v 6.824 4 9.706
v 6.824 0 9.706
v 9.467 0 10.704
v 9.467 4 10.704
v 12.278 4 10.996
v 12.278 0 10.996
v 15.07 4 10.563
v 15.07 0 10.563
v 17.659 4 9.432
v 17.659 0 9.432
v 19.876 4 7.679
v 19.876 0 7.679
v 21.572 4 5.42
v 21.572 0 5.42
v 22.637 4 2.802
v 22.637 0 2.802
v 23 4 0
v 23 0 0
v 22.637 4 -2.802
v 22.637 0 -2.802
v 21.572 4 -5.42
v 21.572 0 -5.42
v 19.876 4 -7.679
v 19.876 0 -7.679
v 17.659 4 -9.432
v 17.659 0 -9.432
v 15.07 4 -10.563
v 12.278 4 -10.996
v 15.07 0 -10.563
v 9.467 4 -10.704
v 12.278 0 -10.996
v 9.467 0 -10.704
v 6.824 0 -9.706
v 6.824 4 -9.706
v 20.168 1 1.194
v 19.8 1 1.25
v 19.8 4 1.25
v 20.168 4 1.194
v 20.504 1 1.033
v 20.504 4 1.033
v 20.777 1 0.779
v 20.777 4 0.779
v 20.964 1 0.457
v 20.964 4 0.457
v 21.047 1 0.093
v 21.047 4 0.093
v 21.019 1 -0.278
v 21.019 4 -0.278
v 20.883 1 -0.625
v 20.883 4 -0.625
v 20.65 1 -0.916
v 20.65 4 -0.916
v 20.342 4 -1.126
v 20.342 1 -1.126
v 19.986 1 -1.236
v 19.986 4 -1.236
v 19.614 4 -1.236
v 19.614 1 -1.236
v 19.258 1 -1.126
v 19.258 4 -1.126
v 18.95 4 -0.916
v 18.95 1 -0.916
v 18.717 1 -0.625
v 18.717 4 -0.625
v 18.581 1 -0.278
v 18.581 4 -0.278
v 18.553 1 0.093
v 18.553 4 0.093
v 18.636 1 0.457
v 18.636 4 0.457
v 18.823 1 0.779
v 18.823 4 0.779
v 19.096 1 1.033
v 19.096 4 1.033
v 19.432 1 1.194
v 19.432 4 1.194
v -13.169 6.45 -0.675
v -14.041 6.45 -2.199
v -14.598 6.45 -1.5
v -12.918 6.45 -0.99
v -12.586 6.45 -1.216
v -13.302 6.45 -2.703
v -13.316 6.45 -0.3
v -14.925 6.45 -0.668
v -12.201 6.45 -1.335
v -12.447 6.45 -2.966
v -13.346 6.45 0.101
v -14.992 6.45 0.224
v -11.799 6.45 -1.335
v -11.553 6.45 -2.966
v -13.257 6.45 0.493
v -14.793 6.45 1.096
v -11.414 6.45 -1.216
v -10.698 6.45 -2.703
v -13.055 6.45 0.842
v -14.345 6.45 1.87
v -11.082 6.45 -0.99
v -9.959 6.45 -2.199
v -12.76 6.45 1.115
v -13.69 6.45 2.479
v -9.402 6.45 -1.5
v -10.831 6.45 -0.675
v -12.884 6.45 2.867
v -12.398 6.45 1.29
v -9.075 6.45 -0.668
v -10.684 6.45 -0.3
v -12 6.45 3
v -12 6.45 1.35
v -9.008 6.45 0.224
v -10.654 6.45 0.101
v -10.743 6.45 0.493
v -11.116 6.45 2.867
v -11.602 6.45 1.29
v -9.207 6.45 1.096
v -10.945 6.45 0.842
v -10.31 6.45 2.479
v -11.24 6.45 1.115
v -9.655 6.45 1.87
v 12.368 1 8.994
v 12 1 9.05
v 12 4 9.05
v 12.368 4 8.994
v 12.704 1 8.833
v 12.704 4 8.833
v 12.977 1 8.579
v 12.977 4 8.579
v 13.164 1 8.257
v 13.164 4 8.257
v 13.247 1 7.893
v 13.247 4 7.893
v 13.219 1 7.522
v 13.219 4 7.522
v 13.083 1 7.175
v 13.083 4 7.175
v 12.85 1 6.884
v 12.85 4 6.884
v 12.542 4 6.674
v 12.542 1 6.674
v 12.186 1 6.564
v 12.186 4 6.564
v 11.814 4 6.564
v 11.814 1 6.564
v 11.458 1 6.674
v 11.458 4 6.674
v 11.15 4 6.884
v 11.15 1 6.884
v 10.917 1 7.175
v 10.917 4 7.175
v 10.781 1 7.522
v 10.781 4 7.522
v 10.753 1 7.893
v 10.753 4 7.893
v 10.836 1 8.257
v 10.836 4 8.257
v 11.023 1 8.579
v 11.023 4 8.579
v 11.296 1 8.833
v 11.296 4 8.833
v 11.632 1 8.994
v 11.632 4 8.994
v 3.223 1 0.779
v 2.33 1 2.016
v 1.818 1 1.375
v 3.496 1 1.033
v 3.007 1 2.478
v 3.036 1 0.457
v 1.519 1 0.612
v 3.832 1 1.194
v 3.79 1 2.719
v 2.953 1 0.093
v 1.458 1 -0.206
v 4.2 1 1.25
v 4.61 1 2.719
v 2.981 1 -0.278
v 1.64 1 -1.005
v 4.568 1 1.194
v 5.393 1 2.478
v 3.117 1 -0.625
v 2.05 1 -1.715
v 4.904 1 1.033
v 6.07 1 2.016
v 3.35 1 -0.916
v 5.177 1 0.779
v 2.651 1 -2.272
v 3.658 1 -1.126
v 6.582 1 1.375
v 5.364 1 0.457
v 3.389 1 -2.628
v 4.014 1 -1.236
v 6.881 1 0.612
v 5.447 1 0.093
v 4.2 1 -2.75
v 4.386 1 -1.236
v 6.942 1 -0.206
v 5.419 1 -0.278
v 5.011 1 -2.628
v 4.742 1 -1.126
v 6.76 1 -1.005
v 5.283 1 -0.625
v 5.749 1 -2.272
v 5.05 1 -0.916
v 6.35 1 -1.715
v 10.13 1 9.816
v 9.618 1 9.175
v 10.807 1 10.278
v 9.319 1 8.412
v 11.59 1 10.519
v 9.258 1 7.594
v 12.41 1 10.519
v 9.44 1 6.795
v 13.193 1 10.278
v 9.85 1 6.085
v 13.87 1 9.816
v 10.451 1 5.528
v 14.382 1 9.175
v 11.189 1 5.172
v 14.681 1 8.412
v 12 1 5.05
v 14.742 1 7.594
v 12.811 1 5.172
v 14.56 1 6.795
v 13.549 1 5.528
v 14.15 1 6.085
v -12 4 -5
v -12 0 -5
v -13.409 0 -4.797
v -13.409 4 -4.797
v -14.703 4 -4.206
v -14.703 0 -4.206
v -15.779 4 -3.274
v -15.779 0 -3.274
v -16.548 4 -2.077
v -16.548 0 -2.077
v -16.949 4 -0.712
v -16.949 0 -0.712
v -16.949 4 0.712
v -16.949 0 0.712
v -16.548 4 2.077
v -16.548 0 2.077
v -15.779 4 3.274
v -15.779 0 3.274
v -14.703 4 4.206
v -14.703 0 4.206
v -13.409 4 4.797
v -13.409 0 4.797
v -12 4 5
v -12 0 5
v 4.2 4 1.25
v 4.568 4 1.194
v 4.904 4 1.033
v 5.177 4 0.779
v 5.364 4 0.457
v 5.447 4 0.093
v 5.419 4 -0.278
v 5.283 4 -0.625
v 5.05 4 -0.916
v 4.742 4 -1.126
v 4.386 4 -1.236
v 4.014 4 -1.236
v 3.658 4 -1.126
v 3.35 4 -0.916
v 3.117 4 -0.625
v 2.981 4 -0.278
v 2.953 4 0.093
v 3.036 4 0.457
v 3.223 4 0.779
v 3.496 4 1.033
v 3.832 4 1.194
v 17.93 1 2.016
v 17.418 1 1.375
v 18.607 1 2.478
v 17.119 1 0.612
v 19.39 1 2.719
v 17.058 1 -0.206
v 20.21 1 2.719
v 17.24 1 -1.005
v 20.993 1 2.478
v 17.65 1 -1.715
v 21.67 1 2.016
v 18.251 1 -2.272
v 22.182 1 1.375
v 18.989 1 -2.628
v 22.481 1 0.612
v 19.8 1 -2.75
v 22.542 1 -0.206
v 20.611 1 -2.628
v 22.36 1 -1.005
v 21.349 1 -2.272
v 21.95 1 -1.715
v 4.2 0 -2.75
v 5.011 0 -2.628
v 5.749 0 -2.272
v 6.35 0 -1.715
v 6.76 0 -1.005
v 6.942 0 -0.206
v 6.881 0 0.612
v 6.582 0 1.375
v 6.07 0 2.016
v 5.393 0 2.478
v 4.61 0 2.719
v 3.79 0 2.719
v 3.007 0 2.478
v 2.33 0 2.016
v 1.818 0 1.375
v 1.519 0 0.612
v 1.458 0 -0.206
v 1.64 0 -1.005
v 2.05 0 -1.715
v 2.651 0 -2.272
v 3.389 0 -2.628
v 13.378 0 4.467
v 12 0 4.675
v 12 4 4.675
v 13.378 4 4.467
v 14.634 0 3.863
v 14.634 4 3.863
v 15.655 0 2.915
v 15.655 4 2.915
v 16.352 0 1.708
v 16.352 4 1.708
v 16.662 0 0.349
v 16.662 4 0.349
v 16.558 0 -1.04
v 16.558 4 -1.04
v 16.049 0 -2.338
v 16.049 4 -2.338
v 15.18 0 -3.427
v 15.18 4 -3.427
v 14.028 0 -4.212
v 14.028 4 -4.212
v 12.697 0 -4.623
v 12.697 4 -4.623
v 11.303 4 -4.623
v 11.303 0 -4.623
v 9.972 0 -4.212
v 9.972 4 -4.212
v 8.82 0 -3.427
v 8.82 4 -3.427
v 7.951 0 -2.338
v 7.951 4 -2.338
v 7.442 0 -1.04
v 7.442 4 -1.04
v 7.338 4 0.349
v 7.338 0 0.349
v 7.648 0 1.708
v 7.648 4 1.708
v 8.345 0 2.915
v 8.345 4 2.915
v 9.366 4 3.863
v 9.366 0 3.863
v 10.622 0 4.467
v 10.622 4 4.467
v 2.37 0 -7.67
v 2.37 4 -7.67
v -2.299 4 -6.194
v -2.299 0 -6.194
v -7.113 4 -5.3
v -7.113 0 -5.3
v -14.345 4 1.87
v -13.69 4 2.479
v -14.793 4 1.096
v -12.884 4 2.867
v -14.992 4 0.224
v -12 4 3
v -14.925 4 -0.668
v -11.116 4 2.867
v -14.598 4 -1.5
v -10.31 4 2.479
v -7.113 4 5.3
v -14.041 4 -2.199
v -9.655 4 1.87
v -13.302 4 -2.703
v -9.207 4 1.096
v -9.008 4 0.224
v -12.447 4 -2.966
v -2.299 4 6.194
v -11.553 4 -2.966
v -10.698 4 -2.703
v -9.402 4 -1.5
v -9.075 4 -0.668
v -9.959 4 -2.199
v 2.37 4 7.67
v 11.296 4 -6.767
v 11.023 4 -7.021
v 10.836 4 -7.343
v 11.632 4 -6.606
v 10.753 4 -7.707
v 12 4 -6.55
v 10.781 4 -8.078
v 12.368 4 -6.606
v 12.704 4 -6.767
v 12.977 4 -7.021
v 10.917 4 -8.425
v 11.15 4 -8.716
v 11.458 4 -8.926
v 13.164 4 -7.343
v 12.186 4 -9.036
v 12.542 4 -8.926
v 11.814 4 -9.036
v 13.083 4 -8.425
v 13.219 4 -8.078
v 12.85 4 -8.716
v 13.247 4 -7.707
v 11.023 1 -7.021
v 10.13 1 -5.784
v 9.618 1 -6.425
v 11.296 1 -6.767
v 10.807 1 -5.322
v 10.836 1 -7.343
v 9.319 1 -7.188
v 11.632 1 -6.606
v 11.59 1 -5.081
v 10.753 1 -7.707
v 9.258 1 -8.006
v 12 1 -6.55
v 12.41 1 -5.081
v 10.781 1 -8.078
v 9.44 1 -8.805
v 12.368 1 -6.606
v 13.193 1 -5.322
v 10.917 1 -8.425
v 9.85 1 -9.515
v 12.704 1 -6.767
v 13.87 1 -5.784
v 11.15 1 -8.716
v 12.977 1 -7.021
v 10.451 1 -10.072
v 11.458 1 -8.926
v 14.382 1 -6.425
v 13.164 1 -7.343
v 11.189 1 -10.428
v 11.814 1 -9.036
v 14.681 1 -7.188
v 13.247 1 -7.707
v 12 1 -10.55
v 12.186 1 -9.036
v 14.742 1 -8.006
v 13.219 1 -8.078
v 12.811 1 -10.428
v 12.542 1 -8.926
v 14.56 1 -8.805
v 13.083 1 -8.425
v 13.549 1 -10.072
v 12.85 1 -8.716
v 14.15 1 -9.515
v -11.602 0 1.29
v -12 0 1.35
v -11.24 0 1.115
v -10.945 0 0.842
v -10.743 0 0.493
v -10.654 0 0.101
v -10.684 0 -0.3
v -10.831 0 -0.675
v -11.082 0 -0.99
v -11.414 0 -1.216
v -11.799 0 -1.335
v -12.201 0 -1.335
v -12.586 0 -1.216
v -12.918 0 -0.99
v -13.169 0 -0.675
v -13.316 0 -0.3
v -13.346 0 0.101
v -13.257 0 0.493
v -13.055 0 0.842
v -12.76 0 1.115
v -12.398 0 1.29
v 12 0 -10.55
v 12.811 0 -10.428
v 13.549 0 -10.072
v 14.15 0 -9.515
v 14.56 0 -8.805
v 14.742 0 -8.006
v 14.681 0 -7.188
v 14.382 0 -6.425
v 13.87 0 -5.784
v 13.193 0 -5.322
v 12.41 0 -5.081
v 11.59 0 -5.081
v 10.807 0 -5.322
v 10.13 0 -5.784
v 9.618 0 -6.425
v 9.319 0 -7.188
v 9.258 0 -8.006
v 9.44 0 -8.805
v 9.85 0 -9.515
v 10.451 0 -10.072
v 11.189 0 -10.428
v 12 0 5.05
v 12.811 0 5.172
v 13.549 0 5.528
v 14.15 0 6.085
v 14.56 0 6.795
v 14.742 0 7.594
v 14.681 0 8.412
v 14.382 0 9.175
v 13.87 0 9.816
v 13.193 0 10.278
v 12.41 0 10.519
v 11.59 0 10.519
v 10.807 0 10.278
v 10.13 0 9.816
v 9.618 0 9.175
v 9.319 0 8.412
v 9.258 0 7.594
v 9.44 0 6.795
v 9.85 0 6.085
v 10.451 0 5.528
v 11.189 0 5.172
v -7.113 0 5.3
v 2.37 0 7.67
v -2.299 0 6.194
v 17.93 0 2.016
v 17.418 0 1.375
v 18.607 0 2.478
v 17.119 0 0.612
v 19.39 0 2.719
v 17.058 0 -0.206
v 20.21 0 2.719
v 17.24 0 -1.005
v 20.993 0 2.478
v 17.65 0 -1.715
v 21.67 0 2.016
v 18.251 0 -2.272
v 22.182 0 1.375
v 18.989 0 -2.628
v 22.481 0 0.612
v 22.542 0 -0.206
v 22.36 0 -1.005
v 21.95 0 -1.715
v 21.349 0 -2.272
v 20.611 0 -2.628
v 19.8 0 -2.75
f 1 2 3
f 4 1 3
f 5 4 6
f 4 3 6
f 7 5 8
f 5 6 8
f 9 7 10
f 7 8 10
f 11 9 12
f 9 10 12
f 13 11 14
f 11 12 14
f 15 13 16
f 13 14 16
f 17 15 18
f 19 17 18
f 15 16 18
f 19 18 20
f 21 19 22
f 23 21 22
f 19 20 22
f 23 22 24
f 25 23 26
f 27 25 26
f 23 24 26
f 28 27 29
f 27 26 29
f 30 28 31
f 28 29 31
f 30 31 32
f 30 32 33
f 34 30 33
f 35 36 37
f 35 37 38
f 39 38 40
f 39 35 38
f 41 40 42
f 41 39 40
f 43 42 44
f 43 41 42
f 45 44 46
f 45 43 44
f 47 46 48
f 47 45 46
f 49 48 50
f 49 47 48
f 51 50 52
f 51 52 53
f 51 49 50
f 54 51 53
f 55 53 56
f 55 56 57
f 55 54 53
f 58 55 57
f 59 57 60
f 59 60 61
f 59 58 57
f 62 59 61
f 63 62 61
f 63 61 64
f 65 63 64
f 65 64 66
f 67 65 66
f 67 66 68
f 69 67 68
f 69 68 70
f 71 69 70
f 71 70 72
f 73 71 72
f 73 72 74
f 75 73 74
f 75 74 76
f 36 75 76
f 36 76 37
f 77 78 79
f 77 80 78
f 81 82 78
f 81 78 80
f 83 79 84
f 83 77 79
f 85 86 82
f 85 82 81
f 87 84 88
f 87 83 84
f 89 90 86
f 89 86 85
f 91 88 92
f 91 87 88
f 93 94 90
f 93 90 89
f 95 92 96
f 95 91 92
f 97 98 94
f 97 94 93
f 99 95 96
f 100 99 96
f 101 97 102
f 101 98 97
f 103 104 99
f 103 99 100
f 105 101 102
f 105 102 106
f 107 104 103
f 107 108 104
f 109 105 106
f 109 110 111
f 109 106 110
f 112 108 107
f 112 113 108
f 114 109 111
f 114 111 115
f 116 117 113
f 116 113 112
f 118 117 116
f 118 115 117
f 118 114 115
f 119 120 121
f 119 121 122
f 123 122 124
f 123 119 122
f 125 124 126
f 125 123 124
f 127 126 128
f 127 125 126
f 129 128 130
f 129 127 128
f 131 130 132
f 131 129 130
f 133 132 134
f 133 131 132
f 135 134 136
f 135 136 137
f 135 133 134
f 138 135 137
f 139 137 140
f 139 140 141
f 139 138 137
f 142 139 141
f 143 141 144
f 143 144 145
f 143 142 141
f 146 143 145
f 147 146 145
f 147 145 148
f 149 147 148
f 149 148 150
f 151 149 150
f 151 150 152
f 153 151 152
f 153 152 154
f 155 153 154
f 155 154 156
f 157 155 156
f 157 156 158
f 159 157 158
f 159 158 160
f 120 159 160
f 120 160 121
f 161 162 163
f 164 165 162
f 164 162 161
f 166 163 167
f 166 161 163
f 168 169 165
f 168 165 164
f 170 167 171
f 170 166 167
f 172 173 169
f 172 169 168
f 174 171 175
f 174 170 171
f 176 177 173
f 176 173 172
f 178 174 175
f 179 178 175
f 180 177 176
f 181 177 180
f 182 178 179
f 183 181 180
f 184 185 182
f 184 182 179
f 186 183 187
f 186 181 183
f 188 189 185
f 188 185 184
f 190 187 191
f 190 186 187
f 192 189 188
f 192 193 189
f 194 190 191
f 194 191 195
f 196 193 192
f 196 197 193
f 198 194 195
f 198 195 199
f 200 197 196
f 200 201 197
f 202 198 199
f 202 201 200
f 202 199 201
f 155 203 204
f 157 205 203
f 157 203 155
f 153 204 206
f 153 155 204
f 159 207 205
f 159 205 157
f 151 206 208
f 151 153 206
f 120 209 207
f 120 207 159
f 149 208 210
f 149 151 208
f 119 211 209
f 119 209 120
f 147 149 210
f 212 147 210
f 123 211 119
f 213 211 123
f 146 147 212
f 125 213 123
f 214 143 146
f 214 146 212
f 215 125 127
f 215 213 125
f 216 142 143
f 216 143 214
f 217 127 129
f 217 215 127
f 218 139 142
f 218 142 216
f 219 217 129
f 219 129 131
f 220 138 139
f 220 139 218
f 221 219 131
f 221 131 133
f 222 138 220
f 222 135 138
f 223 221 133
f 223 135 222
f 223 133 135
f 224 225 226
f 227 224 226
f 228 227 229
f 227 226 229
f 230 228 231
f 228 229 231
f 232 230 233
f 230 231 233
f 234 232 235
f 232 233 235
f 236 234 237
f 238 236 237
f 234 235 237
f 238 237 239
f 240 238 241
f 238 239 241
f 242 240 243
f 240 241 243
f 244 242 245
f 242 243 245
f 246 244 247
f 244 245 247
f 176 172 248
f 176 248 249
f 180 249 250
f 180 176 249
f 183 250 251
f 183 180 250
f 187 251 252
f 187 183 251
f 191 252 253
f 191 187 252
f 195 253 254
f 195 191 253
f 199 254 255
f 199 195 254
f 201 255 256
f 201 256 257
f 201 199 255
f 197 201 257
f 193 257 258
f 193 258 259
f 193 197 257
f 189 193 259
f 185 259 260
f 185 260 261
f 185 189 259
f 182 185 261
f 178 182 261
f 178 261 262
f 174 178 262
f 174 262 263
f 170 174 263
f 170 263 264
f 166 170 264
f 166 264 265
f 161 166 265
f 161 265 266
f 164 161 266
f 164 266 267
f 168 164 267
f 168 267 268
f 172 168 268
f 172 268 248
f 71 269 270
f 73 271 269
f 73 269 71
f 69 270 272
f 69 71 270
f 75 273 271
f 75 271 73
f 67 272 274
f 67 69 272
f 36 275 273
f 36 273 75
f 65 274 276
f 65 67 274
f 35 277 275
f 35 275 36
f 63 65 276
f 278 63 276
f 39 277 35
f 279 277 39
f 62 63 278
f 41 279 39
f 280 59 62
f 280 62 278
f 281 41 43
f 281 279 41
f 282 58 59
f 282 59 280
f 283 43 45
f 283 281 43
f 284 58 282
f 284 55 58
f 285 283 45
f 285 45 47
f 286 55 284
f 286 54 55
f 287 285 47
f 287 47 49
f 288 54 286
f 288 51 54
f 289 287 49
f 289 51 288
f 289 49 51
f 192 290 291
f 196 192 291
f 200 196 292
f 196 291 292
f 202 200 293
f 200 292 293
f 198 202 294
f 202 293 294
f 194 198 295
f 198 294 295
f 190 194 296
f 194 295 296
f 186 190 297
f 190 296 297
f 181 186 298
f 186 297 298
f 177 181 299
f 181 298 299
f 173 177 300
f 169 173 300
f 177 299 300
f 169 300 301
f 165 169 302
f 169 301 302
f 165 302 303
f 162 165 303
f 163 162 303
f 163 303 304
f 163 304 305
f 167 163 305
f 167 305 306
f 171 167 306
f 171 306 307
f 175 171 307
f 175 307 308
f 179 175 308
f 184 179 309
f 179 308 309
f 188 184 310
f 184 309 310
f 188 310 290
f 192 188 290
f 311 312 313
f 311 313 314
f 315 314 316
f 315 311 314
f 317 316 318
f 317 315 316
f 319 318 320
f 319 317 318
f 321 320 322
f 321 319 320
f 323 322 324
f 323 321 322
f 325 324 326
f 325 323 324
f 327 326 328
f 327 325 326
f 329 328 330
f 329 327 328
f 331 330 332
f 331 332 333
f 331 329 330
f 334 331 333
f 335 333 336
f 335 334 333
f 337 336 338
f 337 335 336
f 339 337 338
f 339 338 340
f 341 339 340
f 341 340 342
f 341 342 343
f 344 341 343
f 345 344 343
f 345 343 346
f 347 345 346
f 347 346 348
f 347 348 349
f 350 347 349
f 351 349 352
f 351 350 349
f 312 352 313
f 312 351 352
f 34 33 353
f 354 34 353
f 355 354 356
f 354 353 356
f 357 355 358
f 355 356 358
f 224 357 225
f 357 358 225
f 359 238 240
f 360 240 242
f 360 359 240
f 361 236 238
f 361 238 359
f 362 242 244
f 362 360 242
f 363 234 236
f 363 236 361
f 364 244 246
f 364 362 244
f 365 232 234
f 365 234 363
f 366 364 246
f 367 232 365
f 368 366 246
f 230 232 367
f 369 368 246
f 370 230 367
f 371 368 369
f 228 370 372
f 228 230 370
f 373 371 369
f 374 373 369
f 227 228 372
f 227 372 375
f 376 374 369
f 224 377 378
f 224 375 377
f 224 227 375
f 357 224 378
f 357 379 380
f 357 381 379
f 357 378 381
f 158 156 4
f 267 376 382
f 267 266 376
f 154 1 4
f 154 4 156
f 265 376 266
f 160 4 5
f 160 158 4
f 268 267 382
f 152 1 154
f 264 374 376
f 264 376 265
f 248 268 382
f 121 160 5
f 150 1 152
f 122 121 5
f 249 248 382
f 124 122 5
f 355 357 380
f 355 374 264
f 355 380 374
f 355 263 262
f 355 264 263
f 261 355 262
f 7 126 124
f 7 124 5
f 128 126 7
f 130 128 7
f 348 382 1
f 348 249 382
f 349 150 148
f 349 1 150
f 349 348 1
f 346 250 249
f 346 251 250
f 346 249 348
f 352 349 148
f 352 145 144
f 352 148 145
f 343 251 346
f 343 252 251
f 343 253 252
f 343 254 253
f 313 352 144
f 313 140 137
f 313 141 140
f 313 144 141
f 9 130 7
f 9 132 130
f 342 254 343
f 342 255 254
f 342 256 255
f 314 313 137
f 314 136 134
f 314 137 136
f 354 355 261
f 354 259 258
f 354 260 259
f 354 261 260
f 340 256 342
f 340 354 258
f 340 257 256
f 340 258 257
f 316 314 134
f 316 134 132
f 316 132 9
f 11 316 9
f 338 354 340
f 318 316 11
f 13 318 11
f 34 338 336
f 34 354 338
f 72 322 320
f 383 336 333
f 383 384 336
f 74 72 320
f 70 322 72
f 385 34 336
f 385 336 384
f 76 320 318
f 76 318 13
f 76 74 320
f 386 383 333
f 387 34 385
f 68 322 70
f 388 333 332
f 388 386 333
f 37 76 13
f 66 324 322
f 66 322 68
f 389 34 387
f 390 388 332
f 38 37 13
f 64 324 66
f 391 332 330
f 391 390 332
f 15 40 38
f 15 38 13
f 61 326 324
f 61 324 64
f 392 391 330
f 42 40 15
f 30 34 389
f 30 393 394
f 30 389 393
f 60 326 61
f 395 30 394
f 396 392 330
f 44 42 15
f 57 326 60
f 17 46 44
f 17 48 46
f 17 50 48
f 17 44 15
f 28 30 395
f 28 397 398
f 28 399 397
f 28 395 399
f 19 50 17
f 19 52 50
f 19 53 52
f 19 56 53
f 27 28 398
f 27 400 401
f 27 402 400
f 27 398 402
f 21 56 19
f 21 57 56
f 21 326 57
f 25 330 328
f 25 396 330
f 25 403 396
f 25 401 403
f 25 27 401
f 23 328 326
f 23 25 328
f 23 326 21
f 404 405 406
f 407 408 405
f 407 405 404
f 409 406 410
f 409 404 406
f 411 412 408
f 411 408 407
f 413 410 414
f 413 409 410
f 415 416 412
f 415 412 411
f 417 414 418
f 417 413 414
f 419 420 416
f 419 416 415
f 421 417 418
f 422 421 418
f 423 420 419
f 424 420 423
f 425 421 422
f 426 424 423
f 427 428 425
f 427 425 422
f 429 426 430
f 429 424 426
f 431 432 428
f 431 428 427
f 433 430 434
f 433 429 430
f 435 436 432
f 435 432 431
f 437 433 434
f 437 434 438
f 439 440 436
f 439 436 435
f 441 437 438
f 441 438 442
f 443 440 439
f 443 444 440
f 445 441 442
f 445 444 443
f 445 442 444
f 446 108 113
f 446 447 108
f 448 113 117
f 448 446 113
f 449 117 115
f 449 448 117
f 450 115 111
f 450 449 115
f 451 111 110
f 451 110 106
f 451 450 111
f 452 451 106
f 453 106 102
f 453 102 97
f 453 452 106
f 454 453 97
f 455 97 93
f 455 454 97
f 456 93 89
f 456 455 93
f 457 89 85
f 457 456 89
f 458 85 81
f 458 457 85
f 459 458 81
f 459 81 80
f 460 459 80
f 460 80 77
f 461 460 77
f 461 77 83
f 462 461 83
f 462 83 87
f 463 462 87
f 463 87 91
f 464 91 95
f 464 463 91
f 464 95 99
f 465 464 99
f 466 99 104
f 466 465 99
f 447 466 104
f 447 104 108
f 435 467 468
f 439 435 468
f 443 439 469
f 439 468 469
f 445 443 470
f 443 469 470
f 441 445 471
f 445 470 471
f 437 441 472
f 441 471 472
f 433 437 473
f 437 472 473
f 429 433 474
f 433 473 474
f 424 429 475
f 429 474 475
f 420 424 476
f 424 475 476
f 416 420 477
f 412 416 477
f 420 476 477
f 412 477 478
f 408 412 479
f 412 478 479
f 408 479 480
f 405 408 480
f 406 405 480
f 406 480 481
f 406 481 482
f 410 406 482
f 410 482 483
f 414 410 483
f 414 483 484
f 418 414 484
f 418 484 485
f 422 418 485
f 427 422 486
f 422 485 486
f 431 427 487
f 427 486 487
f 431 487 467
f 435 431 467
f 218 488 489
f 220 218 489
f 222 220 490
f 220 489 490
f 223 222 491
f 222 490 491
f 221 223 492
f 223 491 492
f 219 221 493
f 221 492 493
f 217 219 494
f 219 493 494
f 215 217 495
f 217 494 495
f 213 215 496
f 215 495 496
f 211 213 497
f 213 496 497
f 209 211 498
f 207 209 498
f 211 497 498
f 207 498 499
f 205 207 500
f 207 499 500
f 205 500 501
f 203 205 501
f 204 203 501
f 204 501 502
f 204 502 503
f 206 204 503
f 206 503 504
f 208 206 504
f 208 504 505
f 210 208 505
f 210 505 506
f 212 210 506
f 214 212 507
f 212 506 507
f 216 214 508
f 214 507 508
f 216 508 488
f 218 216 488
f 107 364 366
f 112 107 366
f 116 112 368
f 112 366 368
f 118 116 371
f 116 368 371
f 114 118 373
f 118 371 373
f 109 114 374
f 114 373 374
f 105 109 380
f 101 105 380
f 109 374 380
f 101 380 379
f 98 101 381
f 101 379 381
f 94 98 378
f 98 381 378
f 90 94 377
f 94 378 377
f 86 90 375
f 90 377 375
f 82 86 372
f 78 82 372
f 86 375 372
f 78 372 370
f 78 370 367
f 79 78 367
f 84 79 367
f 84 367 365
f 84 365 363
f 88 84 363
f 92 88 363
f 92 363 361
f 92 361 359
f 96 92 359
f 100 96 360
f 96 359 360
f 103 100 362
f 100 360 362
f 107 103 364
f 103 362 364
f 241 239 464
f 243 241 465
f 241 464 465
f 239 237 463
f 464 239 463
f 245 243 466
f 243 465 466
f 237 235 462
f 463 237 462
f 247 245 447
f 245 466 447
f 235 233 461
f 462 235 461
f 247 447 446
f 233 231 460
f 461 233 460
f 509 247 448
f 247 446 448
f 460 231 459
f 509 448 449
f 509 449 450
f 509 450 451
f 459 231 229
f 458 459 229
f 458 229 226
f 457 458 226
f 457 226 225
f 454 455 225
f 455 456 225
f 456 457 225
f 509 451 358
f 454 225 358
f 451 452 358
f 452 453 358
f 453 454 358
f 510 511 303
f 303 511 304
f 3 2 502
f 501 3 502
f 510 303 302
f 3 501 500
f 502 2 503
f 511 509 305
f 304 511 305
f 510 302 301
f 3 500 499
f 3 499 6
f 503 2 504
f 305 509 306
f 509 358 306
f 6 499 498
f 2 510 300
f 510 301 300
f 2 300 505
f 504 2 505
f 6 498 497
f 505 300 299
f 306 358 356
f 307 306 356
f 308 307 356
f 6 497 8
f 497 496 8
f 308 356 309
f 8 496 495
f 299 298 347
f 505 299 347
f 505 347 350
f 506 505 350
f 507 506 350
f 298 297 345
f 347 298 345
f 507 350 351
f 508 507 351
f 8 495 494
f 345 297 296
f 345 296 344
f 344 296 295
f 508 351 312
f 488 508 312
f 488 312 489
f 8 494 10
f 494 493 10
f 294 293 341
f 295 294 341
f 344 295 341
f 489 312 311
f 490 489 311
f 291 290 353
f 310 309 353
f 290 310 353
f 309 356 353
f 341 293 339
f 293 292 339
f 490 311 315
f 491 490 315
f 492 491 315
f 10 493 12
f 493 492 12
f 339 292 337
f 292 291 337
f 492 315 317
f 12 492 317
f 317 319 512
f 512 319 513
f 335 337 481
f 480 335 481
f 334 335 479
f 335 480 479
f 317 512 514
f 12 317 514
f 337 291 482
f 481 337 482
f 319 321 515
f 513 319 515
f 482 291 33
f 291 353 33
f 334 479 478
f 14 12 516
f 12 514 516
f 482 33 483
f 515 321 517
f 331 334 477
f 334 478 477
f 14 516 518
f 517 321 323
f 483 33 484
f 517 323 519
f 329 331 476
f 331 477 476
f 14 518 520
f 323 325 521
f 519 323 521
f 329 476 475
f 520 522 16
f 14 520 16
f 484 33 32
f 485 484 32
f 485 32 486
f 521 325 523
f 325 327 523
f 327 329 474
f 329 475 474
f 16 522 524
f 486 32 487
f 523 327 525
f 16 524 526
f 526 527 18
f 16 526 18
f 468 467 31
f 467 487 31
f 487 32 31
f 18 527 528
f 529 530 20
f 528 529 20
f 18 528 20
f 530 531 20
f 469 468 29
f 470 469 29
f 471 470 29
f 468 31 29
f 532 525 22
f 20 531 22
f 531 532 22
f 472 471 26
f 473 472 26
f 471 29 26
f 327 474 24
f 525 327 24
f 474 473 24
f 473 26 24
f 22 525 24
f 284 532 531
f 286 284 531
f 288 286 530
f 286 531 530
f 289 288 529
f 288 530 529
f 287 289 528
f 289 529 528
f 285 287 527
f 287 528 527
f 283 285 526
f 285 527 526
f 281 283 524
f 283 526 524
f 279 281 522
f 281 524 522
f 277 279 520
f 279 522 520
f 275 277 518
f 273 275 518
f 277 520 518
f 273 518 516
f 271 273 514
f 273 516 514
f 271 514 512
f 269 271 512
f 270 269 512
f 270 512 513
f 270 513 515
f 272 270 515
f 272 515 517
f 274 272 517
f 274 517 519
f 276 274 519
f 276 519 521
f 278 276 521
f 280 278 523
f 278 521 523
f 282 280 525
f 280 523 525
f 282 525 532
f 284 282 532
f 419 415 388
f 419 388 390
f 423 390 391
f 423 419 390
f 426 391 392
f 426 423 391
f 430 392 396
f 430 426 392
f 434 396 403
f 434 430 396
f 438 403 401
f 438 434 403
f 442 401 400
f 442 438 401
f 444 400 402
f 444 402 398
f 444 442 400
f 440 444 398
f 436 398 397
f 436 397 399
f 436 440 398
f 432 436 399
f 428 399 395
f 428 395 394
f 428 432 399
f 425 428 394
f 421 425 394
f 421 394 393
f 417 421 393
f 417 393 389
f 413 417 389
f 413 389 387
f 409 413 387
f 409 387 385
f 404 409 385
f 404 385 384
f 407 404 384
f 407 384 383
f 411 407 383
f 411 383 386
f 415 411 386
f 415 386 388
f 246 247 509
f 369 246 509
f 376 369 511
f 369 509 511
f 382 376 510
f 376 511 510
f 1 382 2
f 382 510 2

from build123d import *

# Parameters (mm, degrees)
SKETCH1_R           = 1.25
SKETCH1_R_2         = 1.35
SKETCH1_R_3         = 4.675
BOSS_EXTRUDE2_DEPTH = 4
SKETCH2_R           = 2.75
CUT_EXTRUDE1_DEPTH  = 1
SKETCH4_R           = 3
SKETCH4_R_2         = 1.35
BOSS_EXTRUDE3_DEPTH = 2.45


with BuildPart() as part:
    # Sketch1 → Boss-Extrude2 (new body)
    with BuildSketch(Plane(origin=(0, 0, 0), x_dir=(1, 0, 0), z_dir=(0, 1, 0))):
        with BuildLine():
            ThreePointArc((6.823529412, -9.705882353), (23, 0), (6.823529412, 9.705882353))
            ThreePointArc((6.823529412, 9.705882353), (-2.298574999, 6.194299994), (-12, 5))
            ThreePointArc((-12, 5), (-17, 0), (-12, -5))
            ThreePointArc((-12, -5), (-2.298574999, -6.194299994), (6.823529412, -9.705882353))
        make_face()
        with Locations(Location((4.2, 0, 0), (0, 0, 270))):
            Circle(SKETCH1_R, mode=Mode.SUBTRACT)
        with Locations(Location((-12, 0, 0), (0, 0, 270))):
            Circle(SKETCH1_R_2, mode=Mode.SUBTRACT)
        with Locations(Location((12, 7.8, 0), (0, 0, 270))):
            Circle(SKETCH1_R, mode=Mode.SUBTRACT)
        with Locations(Location((19.8, 0, 0), (0, 0, 270))):
            Circle(SKETCH1_R, mode=Mode.SUBTRACT)
        with Locations(Location((12, -7.8, 0), (0, 0, 270))):
            Circle(SKETCH1_R, mode=Mode.SUBTRACT)
        with Locations(Location((12, 0, 0), (0, 0, 270))):
            Circle(SKETCH1_R_3, mode=Mode.SUBTRACT)
    extrude(amount=BOSS_EXTRUDE2_DEPTH)

    # Sketch2 → Cut-Extrude1 (cut)
    with BuildSketch(Plane.XZ):
        with Locations(Location((12, -7.8, 0), (0, 0, 270))):
            Circle(SKETCH2_R)
        with Locations(Location((4.2, 0, 0), (0, 0, 270))):
            Circle(SKETCH2_R)
        with Locations(Location((12, 7.8, 0), (0, 0, 270))):
            Circle(SKETCH2_R)
        with Locations(Location((19.8, 0, 0), (0, 0, 270))):
            Circle(SKETCH2_R)
    extrude(amount=-CUT_EXTRUDE1_DEPTH, mode=Mode.SUBTRACT)

    # Sketch4 → Boss-Extrude3 (add)
    with BuildSketch(Plane(origin=(0, 4, 0), x_dir=(1, 0, 0), z_dir=(0, 1, 0))):
        with Locations(Location((-12, 0, 0), (0, 0, 270))):
            Circle(SKETCH4_R)
        with Locations(Location((-12, 0, 0), (0, 0, 270))):
            Circle(SKETCH4_R_2, mode=Mode.SUBTRACT)
    extrude(amount=BOSS_EXTRUDE3_DEPTH)


solid = part.part
